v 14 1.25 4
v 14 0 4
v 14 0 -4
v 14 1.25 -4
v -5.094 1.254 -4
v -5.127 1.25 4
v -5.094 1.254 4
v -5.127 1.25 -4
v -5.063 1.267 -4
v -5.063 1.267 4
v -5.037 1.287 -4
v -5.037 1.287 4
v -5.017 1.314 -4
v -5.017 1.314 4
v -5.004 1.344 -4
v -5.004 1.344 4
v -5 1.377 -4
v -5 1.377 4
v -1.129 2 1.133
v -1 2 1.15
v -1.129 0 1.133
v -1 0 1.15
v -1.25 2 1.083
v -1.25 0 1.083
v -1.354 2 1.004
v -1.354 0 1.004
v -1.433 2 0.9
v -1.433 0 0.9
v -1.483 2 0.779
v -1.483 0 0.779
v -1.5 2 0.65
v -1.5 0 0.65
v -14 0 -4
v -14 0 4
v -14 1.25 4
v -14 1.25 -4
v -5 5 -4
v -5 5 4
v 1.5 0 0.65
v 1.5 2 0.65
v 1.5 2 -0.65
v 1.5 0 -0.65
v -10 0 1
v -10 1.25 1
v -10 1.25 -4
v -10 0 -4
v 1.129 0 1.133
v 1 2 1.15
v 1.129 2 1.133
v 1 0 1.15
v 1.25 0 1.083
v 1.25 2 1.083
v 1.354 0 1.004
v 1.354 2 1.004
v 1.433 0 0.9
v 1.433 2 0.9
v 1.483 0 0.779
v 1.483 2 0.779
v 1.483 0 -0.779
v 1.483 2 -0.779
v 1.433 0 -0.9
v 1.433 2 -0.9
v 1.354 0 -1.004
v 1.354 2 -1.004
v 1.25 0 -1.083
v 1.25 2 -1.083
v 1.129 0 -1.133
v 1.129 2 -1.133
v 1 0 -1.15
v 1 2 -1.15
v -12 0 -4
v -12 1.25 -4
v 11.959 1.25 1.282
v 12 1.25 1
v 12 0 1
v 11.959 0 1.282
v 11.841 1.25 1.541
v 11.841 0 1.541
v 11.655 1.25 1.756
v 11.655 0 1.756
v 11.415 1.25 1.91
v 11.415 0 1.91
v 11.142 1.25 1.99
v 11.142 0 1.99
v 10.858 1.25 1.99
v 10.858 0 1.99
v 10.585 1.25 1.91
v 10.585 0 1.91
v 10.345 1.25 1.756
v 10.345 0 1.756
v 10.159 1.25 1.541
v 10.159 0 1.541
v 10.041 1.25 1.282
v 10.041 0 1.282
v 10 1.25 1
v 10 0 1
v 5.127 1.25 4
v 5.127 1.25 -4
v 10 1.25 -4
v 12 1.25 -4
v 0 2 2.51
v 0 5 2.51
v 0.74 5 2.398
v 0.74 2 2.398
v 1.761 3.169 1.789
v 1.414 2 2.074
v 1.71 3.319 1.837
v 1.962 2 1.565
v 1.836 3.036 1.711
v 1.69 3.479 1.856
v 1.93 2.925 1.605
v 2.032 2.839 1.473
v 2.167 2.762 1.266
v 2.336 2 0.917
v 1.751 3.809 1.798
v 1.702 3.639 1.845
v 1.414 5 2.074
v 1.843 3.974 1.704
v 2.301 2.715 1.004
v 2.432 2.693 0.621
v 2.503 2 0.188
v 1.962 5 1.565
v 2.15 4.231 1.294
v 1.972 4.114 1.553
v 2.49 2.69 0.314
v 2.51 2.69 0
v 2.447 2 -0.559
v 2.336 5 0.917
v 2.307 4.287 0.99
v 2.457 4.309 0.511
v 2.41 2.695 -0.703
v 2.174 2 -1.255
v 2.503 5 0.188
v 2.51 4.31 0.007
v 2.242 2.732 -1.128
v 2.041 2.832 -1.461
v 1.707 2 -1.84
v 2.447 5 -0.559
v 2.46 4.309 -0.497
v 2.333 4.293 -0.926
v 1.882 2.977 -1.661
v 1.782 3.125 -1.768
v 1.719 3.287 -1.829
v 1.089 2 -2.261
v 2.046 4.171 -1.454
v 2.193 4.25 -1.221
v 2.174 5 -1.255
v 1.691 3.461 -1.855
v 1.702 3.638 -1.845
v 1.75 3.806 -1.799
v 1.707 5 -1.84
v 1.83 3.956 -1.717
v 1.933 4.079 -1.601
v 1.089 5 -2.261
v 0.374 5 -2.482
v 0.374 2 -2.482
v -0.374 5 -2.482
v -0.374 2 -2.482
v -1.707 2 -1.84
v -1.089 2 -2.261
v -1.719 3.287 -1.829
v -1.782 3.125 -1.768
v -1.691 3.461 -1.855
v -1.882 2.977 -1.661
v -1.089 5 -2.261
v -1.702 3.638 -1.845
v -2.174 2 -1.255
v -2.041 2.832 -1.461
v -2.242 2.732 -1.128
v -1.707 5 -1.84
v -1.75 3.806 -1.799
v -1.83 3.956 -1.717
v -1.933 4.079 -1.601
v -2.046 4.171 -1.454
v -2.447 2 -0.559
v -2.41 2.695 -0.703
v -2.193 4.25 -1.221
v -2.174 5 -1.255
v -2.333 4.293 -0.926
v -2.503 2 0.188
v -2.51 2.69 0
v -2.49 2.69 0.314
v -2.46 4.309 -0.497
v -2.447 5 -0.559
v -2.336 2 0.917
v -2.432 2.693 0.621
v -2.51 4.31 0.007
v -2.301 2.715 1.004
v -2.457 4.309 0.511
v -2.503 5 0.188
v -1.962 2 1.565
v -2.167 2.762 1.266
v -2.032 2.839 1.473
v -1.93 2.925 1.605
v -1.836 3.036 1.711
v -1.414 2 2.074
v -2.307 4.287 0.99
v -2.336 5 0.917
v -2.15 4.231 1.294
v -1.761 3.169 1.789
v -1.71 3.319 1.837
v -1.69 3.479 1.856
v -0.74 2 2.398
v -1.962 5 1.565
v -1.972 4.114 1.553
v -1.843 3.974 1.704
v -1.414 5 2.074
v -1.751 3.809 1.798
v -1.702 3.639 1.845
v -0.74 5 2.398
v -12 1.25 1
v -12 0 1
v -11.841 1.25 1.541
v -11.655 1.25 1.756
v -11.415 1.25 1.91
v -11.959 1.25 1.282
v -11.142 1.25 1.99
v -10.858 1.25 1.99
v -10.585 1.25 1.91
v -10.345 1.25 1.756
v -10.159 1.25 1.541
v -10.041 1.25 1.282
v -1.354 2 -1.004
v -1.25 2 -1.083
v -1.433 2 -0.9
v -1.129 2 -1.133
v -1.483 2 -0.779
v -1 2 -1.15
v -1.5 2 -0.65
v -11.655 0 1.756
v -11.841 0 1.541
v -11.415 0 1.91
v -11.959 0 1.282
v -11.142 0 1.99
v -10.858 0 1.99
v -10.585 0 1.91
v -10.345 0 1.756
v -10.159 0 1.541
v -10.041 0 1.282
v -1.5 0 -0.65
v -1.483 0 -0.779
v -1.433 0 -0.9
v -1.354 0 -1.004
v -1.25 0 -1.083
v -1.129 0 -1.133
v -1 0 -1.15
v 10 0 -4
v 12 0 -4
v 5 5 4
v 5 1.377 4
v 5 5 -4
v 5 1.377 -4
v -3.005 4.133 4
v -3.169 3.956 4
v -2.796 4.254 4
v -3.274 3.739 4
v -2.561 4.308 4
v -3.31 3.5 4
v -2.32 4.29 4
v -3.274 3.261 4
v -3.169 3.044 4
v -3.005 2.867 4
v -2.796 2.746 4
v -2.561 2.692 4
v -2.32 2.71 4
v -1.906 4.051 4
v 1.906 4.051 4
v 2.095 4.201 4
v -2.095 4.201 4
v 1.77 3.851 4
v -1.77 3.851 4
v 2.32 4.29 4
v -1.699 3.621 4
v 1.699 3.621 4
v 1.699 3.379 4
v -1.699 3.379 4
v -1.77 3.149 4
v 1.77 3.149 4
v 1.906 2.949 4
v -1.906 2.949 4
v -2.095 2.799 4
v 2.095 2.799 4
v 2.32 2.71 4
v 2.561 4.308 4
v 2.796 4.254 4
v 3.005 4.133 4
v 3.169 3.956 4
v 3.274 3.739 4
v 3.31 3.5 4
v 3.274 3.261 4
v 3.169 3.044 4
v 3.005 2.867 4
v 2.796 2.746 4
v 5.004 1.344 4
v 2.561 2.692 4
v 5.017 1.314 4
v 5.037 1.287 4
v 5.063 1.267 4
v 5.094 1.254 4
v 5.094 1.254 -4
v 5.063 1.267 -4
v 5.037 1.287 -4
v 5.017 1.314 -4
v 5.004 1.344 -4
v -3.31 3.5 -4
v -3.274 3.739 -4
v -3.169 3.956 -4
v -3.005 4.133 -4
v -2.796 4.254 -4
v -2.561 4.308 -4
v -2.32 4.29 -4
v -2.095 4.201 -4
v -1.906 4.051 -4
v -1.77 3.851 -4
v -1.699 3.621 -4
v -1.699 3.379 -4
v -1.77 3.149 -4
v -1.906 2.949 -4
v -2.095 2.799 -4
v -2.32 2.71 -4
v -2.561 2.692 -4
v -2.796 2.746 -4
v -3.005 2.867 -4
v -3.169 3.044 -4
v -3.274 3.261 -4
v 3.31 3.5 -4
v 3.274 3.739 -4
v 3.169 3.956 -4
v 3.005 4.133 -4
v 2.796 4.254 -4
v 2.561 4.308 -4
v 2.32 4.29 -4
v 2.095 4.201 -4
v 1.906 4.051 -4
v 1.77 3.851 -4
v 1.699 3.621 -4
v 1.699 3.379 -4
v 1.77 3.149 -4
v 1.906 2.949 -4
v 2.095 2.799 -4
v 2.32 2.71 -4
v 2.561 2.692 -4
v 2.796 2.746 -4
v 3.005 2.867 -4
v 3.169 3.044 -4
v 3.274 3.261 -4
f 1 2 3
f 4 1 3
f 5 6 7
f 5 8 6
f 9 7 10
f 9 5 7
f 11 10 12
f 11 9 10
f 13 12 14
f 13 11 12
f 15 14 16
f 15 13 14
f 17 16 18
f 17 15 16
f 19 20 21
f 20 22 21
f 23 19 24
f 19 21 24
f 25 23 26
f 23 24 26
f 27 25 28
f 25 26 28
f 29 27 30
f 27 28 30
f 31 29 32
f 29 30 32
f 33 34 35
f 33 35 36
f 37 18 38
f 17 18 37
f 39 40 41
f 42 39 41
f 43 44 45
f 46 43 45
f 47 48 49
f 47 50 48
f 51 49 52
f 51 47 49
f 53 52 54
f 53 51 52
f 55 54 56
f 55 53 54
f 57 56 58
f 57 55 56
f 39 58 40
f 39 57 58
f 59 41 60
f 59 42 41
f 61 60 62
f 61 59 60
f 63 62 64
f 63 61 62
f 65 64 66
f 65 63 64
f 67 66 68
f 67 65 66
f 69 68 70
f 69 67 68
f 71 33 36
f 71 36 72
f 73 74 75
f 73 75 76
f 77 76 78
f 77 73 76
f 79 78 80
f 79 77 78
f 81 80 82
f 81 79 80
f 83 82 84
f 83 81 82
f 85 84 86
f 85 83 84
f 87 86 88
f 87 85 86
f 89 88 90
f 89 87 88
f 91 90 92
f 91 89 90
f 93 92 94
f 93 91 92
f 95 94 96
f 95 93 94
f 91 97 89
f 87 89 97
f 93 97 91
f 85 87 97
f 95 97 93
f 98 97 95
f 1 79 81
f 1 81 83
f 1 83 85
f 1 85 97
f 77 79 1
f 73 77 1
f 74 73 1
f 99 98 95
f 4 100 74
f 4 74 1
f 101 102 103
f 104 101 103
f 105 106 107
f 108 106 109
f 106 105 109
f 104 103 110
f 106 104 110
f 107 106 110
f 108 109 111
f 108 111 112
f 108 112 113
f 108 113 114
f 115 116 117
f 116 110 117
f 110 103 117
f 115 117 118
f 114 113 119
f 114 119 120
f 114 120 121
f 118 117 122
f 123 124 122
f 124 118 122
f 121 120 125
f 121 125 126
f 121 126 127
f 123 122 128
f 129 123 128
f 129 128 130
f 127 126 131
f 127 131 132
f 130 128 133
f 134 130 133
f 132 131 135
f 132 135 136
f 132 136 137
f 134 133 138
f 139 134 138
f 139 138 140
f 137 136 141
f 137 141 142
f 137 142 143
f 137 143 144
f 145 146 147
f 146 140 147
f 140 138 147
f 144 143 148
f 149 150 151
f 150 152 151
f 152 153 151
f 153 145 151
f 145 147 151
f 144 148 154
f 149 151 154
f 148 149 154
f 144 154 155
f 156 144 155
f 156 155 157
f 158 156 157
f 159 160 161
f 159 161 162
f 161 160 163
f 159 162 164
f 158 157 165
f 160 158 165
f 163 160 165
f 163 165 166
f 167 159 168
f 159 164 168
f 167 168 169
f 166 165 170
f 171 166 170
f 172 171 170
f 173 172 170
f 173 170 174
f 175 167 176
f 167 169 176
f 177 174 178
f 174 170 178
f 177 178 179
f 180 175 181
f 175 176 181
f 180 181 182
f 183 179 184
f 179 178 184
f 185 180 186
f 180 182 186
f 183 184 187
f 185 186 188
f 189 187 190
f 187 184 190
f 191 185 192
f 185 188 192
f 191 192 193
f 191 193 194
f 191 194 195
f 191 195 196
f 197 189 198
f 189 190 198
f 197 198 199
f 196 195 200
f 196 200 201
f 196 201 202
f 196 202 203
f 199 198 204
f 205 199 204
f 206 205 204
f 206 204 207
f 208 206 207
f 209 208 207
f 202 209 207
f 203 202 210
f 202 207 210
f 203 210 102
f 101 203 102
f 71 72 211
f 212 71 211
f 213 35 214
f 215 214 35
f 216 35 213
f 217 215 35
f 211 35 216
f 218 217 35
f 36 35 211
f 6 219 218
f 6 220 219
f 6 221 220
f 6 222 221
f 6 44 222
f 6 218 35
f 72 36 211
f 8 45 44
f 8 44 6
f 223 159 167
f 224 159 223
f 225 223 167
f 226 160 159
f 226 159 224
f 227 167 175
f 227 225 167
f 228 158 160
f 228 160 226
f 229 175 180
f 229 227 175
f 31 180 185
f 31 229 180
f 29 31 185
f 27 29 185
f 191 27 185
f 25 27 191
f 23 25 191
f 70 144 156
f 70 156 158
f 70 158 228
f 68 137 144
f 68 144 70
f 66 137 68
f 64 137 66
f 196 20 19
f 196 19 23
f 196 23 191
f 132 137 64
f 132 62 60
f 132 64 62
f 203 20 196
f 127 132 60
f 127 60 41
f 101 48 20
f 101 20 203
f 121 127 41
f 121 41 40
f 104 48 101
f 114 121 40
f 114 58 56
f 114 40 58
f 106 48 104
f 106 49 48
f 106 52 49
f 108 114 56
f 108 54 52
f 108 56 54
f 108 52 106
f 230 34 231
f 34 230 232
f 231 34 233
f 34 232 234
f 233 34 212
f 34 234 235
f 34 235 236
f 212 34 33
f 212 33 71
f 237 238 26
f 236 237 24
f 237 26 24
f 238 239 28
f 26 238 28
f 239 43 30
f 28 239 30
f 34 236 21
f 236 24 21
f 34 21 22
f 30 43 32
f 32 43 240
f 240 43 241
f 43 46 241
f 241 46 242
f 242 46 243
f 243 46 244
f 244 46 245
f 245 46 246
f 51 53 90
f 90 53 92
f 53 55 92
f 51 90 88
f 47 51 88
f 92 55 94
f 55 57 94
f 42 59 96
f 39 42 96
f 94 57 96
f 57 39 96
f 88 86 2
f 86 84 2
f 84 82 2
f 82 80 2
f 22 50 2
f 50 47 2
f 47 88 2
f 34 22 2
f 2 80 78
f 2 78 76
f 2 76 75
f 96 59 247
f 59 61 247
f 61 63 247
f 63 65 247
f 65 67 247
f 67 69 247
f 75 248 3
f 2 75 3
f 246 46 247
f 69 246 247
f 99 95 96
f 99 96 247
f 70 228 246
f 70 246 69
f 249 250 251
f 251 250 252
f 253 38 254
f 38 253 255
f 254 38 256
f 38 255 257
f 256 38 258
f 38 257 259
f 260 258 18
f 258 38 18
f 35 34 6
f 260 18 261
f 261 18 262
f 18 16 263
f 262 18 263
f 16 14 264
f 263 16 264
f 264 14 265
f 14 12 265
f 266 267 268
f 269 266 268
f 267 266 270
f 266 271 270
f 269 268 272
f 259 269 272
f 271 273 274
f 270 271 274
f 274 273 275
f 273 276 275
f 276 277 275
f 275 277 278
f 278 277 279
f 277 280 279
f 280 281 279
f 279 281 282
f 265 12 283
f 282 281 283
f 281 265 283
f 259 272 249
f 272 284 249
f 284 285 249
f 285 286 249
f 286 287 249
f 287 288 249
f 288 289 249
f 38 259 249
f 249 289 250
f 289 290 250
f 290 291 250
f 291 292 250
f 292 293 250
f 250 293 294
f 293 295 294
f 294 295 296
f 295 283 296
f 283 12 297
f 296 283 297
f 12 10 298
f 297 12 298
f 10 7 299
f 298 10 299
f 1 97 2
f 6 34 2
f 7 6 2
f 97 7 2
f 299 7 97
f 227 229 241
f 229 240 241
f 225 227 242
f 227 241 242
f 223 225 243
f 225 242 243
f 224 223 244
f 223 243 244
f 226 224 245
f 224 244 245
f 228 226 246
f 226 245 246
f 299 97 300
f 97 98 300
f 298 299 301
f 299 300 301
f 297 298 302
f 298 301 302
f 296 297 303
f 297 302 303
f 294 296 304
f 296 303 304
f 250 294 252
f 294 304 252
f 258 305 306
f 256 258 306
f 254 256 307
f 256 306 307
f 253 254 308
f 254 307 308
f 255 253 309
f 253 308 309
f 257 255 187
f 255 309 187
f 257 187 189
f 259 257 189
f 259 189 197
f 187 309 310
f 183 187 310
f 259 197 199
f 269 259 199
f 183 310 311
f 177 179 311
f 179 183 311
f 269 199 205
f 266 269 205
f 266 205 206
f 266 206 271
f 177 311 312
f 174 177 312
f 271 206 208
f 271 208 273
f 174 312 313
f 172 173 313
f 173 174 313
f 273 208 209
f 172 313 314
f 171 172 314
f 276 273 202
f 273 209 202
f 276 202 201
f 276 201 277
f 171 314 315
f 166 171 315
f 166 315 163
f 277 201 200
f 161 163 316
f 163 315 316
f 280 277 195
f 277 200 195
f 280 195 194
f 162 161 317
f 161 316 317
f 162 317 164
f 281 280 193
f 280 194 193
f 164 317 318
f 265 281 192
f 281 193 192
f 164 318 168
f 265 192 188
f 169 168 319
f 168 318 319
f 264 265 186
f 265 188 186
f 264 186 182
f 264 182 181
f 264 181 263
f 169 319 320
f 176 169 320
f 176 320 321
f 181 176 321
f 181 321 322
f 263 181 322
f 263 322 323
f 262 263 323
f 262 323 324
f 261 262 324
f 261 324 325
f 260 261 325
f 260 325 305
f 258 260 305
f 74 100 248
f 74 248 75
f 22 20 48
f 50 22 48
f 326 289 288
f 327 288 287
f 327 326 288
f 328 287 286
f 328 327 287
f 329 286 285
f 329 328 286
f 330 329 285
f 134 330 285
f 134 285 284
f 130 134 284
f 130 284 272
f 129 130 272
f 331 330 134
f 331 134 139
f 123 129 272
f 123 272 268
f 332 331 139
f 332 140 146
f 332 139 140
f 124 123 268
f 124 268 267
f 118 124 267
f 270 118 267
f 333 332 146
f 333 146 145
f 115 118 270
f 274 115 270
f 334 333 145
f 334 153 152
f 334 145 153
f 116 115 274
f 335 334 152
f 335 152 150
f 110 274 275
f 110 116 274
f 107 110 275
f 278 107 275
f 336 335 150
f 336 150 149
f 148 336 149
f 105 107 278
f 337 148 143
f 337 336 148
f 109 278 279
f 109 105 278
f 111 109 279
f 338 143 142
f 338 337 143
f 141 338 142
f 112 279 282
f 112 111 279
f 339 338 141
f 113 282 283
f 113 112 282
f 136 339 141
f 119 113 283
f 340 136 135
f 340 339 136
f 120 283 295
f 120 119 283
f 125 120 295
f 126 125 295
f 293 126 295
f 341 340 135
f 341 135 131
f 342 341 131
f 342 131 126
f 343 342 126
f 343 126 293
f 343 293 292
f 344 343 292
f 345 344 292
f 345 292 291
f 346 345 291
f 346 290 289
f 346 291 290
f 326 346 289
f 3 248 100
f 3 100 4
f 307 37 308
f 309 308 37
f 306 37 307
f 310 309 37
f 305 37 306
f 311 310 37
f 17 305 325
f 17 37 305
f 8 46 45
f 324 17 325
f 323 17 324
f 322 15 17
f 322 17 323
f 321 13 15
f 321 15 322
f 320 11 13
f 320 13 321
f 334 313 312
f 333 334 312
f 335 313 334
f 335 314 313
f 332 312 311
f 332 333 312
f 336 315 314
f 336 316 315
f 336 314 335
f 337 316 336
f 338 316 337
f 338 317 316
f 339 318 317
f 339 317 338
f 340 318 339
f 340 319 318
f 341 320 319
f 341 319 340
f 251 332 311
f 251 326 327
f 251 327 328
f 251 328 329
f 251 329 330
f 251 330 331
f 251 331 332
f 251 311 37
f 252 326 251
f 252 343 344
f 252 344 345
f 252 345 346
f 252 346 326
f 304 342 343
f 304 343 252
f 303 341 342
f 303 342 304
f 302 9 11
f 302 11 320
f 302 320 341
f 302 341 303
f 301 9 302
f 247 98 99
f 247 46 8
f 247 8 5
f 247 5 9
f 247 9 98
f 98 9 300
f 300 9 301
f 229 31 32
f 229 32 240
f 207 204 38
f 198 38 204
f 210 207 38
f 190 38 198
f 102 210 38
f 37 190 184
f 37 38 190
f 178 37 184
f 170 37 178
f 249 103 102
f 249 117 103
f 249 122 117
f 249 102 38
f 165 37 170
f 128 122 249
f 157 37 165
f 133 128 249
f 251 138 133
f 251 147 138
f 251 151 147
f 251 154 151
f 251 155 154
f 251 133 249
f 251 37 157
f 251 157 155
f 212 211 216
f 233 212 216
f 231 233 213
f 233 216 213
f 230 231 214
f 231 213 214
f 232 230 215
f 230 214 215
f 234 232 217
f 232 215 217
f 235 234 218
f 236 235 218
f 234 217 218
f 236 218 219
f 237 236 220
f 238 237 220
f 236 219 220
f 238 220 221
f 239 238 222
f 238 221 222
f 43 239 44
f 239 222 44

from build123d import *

# Parameters (mm, degrees)
SKETCH1_W           = 28
SKETCH1_H           = 8
BOSS_EXTRUDE1_DEPTH = 1.25
SKETCH2_W           = 10
SKETCH2_H           = 8
BOSS_EXTRUDE2_DEPTH = 3.75
SKETCH3_R           = 2.51
CUT_EXTRUDE1_DEPTH  = 3
SKETCH4_W           = 3
SKETCH4_H           = 2.3
CUT_EXTRUDE2_DEPTH  = 15.866068747
CUT_EXTRUDE4_DEPTH  = 16.035374954
SKETCH7_R           = 0.81
CUT_EXTRUDE5_DEPTH  = 17.881943016
FILLET1_R           = 0.5
FILLET2_R           = 0.127


with BuildPart() as part:
    # Sketch1 → Boss-Extrude1 (new body)
    with BuildSketch(Plane(origin=(0, 0, 0), x_dir=(1, 0, 0), z_dir=(0, 1, 0))):
        Rectangle(SKETCH1_W, SKETCH1_H)
    extrude(amount=BOSS_EXTRUDE1_DEPTH)

    # Sketch2 → Boss-Extrude2 (add)
    with BuildSketch(Plane(origin=(0, 1.25, 0), x_dir=(1, 0, 0), z_dir=(0, 1, 0))):
        Rectangle(SKETCH2_W, SKETCH2_H)
    extrude(amount=BOSS_EXTRUDE2_DEPTH)

    # Sketch3 → Cut-Extrude1 (cut)
    with BuildSketch(Plane(origin=(0, 5, 0), x_dir=(1, 0, 0), z_dir=(0, 1, 0))):
        with Locations(Location((0, 0, 0), (0, 0, 270))):
            Circle(SKETCH3_R)
    extrude(amount=-CUT_EXTRUDE1_DEPTH, mode=Mode.SUBTRACT)

    # Sketch4 → Cut-Extrude2 (cut, through all)
    with BuildSketch(Plane(origin=(0, 2, 0), x_dir=(1, 0, 0), z_dir=(0, 1, 0))):
        Rectangle(SKETCH4_W, SKETCH4_H)
    extrude(amount=-CUT_EXTRUDE2_DEPTH, mode=Mode.SUBTRACT)

    # Sketch6 → Cut-Extrude4 (cut, through all)
    with BuildSketch(Plane(origin=(0, 1.25, 0), x_dir=(1, 0, 0), z_dir=(0, 1, 0))):
        with BuildLine():
            Line((12, 4), (12, -1))
            ThreePointArc((12, -1), (11, -2), (10, -1))
            Line((10, -1), (10, 4))
            Line((10, 4), (12, 4))
        make_face()
        with BuildLine():
            Line((-12, 4), (-12, -1))
            ThreePointArc((-12, -1), (-11, -2), (-10, -1))
            Line((-10, -1), (-10, 4))
            Line((-10, 4), (-12, 4))
        make_face()
    extrude(amount=-CUT_EXTRUDE4_DEPTH, mode=Mode.SUBTRACT)

    # Sketch7 → Cut-Extrude5 (cut, through all)
    with BuildSketch(Plane(origin=(0, 0, -4), x_dir=(-1, 0, 0), z_dir=(0, 0, -1))):
        with Locations((2.5, 3.5)):
            Circle(SKETCH7_R)
    cut_extrude5 = extrude(amount=-CUT_EXTRUDE5_DEPTH, mode=Mode.SUBTRACT)

    # Mirror1: Cut-Extrude5 across plane
    add(cut_extrude5.mirror(Plane.ZY), mode=Mode.SUBTRACT)

    # Fillet1
    fillet1_edges = [part.edges().sort_by_distance(p)[0] for p in [
        (-1.5, 1, -1.15),
        (1.5, 1, -1.15),
        (1.5, 1, 1.15),
        (-1.5, 1, 1.15),
    ]]
    fillet(fillet1_edges, radius=FILLET1_R)

    # Fillet2
    fillet2_edges = [part.edges().sort_by_distance(p)[0] for p in [
        (5, 1.25, 0),
        (-5, 1.25, 0),
    ]]
    fillet(fillet2_edges, radius=FILLET2_R)


solid = part.part
